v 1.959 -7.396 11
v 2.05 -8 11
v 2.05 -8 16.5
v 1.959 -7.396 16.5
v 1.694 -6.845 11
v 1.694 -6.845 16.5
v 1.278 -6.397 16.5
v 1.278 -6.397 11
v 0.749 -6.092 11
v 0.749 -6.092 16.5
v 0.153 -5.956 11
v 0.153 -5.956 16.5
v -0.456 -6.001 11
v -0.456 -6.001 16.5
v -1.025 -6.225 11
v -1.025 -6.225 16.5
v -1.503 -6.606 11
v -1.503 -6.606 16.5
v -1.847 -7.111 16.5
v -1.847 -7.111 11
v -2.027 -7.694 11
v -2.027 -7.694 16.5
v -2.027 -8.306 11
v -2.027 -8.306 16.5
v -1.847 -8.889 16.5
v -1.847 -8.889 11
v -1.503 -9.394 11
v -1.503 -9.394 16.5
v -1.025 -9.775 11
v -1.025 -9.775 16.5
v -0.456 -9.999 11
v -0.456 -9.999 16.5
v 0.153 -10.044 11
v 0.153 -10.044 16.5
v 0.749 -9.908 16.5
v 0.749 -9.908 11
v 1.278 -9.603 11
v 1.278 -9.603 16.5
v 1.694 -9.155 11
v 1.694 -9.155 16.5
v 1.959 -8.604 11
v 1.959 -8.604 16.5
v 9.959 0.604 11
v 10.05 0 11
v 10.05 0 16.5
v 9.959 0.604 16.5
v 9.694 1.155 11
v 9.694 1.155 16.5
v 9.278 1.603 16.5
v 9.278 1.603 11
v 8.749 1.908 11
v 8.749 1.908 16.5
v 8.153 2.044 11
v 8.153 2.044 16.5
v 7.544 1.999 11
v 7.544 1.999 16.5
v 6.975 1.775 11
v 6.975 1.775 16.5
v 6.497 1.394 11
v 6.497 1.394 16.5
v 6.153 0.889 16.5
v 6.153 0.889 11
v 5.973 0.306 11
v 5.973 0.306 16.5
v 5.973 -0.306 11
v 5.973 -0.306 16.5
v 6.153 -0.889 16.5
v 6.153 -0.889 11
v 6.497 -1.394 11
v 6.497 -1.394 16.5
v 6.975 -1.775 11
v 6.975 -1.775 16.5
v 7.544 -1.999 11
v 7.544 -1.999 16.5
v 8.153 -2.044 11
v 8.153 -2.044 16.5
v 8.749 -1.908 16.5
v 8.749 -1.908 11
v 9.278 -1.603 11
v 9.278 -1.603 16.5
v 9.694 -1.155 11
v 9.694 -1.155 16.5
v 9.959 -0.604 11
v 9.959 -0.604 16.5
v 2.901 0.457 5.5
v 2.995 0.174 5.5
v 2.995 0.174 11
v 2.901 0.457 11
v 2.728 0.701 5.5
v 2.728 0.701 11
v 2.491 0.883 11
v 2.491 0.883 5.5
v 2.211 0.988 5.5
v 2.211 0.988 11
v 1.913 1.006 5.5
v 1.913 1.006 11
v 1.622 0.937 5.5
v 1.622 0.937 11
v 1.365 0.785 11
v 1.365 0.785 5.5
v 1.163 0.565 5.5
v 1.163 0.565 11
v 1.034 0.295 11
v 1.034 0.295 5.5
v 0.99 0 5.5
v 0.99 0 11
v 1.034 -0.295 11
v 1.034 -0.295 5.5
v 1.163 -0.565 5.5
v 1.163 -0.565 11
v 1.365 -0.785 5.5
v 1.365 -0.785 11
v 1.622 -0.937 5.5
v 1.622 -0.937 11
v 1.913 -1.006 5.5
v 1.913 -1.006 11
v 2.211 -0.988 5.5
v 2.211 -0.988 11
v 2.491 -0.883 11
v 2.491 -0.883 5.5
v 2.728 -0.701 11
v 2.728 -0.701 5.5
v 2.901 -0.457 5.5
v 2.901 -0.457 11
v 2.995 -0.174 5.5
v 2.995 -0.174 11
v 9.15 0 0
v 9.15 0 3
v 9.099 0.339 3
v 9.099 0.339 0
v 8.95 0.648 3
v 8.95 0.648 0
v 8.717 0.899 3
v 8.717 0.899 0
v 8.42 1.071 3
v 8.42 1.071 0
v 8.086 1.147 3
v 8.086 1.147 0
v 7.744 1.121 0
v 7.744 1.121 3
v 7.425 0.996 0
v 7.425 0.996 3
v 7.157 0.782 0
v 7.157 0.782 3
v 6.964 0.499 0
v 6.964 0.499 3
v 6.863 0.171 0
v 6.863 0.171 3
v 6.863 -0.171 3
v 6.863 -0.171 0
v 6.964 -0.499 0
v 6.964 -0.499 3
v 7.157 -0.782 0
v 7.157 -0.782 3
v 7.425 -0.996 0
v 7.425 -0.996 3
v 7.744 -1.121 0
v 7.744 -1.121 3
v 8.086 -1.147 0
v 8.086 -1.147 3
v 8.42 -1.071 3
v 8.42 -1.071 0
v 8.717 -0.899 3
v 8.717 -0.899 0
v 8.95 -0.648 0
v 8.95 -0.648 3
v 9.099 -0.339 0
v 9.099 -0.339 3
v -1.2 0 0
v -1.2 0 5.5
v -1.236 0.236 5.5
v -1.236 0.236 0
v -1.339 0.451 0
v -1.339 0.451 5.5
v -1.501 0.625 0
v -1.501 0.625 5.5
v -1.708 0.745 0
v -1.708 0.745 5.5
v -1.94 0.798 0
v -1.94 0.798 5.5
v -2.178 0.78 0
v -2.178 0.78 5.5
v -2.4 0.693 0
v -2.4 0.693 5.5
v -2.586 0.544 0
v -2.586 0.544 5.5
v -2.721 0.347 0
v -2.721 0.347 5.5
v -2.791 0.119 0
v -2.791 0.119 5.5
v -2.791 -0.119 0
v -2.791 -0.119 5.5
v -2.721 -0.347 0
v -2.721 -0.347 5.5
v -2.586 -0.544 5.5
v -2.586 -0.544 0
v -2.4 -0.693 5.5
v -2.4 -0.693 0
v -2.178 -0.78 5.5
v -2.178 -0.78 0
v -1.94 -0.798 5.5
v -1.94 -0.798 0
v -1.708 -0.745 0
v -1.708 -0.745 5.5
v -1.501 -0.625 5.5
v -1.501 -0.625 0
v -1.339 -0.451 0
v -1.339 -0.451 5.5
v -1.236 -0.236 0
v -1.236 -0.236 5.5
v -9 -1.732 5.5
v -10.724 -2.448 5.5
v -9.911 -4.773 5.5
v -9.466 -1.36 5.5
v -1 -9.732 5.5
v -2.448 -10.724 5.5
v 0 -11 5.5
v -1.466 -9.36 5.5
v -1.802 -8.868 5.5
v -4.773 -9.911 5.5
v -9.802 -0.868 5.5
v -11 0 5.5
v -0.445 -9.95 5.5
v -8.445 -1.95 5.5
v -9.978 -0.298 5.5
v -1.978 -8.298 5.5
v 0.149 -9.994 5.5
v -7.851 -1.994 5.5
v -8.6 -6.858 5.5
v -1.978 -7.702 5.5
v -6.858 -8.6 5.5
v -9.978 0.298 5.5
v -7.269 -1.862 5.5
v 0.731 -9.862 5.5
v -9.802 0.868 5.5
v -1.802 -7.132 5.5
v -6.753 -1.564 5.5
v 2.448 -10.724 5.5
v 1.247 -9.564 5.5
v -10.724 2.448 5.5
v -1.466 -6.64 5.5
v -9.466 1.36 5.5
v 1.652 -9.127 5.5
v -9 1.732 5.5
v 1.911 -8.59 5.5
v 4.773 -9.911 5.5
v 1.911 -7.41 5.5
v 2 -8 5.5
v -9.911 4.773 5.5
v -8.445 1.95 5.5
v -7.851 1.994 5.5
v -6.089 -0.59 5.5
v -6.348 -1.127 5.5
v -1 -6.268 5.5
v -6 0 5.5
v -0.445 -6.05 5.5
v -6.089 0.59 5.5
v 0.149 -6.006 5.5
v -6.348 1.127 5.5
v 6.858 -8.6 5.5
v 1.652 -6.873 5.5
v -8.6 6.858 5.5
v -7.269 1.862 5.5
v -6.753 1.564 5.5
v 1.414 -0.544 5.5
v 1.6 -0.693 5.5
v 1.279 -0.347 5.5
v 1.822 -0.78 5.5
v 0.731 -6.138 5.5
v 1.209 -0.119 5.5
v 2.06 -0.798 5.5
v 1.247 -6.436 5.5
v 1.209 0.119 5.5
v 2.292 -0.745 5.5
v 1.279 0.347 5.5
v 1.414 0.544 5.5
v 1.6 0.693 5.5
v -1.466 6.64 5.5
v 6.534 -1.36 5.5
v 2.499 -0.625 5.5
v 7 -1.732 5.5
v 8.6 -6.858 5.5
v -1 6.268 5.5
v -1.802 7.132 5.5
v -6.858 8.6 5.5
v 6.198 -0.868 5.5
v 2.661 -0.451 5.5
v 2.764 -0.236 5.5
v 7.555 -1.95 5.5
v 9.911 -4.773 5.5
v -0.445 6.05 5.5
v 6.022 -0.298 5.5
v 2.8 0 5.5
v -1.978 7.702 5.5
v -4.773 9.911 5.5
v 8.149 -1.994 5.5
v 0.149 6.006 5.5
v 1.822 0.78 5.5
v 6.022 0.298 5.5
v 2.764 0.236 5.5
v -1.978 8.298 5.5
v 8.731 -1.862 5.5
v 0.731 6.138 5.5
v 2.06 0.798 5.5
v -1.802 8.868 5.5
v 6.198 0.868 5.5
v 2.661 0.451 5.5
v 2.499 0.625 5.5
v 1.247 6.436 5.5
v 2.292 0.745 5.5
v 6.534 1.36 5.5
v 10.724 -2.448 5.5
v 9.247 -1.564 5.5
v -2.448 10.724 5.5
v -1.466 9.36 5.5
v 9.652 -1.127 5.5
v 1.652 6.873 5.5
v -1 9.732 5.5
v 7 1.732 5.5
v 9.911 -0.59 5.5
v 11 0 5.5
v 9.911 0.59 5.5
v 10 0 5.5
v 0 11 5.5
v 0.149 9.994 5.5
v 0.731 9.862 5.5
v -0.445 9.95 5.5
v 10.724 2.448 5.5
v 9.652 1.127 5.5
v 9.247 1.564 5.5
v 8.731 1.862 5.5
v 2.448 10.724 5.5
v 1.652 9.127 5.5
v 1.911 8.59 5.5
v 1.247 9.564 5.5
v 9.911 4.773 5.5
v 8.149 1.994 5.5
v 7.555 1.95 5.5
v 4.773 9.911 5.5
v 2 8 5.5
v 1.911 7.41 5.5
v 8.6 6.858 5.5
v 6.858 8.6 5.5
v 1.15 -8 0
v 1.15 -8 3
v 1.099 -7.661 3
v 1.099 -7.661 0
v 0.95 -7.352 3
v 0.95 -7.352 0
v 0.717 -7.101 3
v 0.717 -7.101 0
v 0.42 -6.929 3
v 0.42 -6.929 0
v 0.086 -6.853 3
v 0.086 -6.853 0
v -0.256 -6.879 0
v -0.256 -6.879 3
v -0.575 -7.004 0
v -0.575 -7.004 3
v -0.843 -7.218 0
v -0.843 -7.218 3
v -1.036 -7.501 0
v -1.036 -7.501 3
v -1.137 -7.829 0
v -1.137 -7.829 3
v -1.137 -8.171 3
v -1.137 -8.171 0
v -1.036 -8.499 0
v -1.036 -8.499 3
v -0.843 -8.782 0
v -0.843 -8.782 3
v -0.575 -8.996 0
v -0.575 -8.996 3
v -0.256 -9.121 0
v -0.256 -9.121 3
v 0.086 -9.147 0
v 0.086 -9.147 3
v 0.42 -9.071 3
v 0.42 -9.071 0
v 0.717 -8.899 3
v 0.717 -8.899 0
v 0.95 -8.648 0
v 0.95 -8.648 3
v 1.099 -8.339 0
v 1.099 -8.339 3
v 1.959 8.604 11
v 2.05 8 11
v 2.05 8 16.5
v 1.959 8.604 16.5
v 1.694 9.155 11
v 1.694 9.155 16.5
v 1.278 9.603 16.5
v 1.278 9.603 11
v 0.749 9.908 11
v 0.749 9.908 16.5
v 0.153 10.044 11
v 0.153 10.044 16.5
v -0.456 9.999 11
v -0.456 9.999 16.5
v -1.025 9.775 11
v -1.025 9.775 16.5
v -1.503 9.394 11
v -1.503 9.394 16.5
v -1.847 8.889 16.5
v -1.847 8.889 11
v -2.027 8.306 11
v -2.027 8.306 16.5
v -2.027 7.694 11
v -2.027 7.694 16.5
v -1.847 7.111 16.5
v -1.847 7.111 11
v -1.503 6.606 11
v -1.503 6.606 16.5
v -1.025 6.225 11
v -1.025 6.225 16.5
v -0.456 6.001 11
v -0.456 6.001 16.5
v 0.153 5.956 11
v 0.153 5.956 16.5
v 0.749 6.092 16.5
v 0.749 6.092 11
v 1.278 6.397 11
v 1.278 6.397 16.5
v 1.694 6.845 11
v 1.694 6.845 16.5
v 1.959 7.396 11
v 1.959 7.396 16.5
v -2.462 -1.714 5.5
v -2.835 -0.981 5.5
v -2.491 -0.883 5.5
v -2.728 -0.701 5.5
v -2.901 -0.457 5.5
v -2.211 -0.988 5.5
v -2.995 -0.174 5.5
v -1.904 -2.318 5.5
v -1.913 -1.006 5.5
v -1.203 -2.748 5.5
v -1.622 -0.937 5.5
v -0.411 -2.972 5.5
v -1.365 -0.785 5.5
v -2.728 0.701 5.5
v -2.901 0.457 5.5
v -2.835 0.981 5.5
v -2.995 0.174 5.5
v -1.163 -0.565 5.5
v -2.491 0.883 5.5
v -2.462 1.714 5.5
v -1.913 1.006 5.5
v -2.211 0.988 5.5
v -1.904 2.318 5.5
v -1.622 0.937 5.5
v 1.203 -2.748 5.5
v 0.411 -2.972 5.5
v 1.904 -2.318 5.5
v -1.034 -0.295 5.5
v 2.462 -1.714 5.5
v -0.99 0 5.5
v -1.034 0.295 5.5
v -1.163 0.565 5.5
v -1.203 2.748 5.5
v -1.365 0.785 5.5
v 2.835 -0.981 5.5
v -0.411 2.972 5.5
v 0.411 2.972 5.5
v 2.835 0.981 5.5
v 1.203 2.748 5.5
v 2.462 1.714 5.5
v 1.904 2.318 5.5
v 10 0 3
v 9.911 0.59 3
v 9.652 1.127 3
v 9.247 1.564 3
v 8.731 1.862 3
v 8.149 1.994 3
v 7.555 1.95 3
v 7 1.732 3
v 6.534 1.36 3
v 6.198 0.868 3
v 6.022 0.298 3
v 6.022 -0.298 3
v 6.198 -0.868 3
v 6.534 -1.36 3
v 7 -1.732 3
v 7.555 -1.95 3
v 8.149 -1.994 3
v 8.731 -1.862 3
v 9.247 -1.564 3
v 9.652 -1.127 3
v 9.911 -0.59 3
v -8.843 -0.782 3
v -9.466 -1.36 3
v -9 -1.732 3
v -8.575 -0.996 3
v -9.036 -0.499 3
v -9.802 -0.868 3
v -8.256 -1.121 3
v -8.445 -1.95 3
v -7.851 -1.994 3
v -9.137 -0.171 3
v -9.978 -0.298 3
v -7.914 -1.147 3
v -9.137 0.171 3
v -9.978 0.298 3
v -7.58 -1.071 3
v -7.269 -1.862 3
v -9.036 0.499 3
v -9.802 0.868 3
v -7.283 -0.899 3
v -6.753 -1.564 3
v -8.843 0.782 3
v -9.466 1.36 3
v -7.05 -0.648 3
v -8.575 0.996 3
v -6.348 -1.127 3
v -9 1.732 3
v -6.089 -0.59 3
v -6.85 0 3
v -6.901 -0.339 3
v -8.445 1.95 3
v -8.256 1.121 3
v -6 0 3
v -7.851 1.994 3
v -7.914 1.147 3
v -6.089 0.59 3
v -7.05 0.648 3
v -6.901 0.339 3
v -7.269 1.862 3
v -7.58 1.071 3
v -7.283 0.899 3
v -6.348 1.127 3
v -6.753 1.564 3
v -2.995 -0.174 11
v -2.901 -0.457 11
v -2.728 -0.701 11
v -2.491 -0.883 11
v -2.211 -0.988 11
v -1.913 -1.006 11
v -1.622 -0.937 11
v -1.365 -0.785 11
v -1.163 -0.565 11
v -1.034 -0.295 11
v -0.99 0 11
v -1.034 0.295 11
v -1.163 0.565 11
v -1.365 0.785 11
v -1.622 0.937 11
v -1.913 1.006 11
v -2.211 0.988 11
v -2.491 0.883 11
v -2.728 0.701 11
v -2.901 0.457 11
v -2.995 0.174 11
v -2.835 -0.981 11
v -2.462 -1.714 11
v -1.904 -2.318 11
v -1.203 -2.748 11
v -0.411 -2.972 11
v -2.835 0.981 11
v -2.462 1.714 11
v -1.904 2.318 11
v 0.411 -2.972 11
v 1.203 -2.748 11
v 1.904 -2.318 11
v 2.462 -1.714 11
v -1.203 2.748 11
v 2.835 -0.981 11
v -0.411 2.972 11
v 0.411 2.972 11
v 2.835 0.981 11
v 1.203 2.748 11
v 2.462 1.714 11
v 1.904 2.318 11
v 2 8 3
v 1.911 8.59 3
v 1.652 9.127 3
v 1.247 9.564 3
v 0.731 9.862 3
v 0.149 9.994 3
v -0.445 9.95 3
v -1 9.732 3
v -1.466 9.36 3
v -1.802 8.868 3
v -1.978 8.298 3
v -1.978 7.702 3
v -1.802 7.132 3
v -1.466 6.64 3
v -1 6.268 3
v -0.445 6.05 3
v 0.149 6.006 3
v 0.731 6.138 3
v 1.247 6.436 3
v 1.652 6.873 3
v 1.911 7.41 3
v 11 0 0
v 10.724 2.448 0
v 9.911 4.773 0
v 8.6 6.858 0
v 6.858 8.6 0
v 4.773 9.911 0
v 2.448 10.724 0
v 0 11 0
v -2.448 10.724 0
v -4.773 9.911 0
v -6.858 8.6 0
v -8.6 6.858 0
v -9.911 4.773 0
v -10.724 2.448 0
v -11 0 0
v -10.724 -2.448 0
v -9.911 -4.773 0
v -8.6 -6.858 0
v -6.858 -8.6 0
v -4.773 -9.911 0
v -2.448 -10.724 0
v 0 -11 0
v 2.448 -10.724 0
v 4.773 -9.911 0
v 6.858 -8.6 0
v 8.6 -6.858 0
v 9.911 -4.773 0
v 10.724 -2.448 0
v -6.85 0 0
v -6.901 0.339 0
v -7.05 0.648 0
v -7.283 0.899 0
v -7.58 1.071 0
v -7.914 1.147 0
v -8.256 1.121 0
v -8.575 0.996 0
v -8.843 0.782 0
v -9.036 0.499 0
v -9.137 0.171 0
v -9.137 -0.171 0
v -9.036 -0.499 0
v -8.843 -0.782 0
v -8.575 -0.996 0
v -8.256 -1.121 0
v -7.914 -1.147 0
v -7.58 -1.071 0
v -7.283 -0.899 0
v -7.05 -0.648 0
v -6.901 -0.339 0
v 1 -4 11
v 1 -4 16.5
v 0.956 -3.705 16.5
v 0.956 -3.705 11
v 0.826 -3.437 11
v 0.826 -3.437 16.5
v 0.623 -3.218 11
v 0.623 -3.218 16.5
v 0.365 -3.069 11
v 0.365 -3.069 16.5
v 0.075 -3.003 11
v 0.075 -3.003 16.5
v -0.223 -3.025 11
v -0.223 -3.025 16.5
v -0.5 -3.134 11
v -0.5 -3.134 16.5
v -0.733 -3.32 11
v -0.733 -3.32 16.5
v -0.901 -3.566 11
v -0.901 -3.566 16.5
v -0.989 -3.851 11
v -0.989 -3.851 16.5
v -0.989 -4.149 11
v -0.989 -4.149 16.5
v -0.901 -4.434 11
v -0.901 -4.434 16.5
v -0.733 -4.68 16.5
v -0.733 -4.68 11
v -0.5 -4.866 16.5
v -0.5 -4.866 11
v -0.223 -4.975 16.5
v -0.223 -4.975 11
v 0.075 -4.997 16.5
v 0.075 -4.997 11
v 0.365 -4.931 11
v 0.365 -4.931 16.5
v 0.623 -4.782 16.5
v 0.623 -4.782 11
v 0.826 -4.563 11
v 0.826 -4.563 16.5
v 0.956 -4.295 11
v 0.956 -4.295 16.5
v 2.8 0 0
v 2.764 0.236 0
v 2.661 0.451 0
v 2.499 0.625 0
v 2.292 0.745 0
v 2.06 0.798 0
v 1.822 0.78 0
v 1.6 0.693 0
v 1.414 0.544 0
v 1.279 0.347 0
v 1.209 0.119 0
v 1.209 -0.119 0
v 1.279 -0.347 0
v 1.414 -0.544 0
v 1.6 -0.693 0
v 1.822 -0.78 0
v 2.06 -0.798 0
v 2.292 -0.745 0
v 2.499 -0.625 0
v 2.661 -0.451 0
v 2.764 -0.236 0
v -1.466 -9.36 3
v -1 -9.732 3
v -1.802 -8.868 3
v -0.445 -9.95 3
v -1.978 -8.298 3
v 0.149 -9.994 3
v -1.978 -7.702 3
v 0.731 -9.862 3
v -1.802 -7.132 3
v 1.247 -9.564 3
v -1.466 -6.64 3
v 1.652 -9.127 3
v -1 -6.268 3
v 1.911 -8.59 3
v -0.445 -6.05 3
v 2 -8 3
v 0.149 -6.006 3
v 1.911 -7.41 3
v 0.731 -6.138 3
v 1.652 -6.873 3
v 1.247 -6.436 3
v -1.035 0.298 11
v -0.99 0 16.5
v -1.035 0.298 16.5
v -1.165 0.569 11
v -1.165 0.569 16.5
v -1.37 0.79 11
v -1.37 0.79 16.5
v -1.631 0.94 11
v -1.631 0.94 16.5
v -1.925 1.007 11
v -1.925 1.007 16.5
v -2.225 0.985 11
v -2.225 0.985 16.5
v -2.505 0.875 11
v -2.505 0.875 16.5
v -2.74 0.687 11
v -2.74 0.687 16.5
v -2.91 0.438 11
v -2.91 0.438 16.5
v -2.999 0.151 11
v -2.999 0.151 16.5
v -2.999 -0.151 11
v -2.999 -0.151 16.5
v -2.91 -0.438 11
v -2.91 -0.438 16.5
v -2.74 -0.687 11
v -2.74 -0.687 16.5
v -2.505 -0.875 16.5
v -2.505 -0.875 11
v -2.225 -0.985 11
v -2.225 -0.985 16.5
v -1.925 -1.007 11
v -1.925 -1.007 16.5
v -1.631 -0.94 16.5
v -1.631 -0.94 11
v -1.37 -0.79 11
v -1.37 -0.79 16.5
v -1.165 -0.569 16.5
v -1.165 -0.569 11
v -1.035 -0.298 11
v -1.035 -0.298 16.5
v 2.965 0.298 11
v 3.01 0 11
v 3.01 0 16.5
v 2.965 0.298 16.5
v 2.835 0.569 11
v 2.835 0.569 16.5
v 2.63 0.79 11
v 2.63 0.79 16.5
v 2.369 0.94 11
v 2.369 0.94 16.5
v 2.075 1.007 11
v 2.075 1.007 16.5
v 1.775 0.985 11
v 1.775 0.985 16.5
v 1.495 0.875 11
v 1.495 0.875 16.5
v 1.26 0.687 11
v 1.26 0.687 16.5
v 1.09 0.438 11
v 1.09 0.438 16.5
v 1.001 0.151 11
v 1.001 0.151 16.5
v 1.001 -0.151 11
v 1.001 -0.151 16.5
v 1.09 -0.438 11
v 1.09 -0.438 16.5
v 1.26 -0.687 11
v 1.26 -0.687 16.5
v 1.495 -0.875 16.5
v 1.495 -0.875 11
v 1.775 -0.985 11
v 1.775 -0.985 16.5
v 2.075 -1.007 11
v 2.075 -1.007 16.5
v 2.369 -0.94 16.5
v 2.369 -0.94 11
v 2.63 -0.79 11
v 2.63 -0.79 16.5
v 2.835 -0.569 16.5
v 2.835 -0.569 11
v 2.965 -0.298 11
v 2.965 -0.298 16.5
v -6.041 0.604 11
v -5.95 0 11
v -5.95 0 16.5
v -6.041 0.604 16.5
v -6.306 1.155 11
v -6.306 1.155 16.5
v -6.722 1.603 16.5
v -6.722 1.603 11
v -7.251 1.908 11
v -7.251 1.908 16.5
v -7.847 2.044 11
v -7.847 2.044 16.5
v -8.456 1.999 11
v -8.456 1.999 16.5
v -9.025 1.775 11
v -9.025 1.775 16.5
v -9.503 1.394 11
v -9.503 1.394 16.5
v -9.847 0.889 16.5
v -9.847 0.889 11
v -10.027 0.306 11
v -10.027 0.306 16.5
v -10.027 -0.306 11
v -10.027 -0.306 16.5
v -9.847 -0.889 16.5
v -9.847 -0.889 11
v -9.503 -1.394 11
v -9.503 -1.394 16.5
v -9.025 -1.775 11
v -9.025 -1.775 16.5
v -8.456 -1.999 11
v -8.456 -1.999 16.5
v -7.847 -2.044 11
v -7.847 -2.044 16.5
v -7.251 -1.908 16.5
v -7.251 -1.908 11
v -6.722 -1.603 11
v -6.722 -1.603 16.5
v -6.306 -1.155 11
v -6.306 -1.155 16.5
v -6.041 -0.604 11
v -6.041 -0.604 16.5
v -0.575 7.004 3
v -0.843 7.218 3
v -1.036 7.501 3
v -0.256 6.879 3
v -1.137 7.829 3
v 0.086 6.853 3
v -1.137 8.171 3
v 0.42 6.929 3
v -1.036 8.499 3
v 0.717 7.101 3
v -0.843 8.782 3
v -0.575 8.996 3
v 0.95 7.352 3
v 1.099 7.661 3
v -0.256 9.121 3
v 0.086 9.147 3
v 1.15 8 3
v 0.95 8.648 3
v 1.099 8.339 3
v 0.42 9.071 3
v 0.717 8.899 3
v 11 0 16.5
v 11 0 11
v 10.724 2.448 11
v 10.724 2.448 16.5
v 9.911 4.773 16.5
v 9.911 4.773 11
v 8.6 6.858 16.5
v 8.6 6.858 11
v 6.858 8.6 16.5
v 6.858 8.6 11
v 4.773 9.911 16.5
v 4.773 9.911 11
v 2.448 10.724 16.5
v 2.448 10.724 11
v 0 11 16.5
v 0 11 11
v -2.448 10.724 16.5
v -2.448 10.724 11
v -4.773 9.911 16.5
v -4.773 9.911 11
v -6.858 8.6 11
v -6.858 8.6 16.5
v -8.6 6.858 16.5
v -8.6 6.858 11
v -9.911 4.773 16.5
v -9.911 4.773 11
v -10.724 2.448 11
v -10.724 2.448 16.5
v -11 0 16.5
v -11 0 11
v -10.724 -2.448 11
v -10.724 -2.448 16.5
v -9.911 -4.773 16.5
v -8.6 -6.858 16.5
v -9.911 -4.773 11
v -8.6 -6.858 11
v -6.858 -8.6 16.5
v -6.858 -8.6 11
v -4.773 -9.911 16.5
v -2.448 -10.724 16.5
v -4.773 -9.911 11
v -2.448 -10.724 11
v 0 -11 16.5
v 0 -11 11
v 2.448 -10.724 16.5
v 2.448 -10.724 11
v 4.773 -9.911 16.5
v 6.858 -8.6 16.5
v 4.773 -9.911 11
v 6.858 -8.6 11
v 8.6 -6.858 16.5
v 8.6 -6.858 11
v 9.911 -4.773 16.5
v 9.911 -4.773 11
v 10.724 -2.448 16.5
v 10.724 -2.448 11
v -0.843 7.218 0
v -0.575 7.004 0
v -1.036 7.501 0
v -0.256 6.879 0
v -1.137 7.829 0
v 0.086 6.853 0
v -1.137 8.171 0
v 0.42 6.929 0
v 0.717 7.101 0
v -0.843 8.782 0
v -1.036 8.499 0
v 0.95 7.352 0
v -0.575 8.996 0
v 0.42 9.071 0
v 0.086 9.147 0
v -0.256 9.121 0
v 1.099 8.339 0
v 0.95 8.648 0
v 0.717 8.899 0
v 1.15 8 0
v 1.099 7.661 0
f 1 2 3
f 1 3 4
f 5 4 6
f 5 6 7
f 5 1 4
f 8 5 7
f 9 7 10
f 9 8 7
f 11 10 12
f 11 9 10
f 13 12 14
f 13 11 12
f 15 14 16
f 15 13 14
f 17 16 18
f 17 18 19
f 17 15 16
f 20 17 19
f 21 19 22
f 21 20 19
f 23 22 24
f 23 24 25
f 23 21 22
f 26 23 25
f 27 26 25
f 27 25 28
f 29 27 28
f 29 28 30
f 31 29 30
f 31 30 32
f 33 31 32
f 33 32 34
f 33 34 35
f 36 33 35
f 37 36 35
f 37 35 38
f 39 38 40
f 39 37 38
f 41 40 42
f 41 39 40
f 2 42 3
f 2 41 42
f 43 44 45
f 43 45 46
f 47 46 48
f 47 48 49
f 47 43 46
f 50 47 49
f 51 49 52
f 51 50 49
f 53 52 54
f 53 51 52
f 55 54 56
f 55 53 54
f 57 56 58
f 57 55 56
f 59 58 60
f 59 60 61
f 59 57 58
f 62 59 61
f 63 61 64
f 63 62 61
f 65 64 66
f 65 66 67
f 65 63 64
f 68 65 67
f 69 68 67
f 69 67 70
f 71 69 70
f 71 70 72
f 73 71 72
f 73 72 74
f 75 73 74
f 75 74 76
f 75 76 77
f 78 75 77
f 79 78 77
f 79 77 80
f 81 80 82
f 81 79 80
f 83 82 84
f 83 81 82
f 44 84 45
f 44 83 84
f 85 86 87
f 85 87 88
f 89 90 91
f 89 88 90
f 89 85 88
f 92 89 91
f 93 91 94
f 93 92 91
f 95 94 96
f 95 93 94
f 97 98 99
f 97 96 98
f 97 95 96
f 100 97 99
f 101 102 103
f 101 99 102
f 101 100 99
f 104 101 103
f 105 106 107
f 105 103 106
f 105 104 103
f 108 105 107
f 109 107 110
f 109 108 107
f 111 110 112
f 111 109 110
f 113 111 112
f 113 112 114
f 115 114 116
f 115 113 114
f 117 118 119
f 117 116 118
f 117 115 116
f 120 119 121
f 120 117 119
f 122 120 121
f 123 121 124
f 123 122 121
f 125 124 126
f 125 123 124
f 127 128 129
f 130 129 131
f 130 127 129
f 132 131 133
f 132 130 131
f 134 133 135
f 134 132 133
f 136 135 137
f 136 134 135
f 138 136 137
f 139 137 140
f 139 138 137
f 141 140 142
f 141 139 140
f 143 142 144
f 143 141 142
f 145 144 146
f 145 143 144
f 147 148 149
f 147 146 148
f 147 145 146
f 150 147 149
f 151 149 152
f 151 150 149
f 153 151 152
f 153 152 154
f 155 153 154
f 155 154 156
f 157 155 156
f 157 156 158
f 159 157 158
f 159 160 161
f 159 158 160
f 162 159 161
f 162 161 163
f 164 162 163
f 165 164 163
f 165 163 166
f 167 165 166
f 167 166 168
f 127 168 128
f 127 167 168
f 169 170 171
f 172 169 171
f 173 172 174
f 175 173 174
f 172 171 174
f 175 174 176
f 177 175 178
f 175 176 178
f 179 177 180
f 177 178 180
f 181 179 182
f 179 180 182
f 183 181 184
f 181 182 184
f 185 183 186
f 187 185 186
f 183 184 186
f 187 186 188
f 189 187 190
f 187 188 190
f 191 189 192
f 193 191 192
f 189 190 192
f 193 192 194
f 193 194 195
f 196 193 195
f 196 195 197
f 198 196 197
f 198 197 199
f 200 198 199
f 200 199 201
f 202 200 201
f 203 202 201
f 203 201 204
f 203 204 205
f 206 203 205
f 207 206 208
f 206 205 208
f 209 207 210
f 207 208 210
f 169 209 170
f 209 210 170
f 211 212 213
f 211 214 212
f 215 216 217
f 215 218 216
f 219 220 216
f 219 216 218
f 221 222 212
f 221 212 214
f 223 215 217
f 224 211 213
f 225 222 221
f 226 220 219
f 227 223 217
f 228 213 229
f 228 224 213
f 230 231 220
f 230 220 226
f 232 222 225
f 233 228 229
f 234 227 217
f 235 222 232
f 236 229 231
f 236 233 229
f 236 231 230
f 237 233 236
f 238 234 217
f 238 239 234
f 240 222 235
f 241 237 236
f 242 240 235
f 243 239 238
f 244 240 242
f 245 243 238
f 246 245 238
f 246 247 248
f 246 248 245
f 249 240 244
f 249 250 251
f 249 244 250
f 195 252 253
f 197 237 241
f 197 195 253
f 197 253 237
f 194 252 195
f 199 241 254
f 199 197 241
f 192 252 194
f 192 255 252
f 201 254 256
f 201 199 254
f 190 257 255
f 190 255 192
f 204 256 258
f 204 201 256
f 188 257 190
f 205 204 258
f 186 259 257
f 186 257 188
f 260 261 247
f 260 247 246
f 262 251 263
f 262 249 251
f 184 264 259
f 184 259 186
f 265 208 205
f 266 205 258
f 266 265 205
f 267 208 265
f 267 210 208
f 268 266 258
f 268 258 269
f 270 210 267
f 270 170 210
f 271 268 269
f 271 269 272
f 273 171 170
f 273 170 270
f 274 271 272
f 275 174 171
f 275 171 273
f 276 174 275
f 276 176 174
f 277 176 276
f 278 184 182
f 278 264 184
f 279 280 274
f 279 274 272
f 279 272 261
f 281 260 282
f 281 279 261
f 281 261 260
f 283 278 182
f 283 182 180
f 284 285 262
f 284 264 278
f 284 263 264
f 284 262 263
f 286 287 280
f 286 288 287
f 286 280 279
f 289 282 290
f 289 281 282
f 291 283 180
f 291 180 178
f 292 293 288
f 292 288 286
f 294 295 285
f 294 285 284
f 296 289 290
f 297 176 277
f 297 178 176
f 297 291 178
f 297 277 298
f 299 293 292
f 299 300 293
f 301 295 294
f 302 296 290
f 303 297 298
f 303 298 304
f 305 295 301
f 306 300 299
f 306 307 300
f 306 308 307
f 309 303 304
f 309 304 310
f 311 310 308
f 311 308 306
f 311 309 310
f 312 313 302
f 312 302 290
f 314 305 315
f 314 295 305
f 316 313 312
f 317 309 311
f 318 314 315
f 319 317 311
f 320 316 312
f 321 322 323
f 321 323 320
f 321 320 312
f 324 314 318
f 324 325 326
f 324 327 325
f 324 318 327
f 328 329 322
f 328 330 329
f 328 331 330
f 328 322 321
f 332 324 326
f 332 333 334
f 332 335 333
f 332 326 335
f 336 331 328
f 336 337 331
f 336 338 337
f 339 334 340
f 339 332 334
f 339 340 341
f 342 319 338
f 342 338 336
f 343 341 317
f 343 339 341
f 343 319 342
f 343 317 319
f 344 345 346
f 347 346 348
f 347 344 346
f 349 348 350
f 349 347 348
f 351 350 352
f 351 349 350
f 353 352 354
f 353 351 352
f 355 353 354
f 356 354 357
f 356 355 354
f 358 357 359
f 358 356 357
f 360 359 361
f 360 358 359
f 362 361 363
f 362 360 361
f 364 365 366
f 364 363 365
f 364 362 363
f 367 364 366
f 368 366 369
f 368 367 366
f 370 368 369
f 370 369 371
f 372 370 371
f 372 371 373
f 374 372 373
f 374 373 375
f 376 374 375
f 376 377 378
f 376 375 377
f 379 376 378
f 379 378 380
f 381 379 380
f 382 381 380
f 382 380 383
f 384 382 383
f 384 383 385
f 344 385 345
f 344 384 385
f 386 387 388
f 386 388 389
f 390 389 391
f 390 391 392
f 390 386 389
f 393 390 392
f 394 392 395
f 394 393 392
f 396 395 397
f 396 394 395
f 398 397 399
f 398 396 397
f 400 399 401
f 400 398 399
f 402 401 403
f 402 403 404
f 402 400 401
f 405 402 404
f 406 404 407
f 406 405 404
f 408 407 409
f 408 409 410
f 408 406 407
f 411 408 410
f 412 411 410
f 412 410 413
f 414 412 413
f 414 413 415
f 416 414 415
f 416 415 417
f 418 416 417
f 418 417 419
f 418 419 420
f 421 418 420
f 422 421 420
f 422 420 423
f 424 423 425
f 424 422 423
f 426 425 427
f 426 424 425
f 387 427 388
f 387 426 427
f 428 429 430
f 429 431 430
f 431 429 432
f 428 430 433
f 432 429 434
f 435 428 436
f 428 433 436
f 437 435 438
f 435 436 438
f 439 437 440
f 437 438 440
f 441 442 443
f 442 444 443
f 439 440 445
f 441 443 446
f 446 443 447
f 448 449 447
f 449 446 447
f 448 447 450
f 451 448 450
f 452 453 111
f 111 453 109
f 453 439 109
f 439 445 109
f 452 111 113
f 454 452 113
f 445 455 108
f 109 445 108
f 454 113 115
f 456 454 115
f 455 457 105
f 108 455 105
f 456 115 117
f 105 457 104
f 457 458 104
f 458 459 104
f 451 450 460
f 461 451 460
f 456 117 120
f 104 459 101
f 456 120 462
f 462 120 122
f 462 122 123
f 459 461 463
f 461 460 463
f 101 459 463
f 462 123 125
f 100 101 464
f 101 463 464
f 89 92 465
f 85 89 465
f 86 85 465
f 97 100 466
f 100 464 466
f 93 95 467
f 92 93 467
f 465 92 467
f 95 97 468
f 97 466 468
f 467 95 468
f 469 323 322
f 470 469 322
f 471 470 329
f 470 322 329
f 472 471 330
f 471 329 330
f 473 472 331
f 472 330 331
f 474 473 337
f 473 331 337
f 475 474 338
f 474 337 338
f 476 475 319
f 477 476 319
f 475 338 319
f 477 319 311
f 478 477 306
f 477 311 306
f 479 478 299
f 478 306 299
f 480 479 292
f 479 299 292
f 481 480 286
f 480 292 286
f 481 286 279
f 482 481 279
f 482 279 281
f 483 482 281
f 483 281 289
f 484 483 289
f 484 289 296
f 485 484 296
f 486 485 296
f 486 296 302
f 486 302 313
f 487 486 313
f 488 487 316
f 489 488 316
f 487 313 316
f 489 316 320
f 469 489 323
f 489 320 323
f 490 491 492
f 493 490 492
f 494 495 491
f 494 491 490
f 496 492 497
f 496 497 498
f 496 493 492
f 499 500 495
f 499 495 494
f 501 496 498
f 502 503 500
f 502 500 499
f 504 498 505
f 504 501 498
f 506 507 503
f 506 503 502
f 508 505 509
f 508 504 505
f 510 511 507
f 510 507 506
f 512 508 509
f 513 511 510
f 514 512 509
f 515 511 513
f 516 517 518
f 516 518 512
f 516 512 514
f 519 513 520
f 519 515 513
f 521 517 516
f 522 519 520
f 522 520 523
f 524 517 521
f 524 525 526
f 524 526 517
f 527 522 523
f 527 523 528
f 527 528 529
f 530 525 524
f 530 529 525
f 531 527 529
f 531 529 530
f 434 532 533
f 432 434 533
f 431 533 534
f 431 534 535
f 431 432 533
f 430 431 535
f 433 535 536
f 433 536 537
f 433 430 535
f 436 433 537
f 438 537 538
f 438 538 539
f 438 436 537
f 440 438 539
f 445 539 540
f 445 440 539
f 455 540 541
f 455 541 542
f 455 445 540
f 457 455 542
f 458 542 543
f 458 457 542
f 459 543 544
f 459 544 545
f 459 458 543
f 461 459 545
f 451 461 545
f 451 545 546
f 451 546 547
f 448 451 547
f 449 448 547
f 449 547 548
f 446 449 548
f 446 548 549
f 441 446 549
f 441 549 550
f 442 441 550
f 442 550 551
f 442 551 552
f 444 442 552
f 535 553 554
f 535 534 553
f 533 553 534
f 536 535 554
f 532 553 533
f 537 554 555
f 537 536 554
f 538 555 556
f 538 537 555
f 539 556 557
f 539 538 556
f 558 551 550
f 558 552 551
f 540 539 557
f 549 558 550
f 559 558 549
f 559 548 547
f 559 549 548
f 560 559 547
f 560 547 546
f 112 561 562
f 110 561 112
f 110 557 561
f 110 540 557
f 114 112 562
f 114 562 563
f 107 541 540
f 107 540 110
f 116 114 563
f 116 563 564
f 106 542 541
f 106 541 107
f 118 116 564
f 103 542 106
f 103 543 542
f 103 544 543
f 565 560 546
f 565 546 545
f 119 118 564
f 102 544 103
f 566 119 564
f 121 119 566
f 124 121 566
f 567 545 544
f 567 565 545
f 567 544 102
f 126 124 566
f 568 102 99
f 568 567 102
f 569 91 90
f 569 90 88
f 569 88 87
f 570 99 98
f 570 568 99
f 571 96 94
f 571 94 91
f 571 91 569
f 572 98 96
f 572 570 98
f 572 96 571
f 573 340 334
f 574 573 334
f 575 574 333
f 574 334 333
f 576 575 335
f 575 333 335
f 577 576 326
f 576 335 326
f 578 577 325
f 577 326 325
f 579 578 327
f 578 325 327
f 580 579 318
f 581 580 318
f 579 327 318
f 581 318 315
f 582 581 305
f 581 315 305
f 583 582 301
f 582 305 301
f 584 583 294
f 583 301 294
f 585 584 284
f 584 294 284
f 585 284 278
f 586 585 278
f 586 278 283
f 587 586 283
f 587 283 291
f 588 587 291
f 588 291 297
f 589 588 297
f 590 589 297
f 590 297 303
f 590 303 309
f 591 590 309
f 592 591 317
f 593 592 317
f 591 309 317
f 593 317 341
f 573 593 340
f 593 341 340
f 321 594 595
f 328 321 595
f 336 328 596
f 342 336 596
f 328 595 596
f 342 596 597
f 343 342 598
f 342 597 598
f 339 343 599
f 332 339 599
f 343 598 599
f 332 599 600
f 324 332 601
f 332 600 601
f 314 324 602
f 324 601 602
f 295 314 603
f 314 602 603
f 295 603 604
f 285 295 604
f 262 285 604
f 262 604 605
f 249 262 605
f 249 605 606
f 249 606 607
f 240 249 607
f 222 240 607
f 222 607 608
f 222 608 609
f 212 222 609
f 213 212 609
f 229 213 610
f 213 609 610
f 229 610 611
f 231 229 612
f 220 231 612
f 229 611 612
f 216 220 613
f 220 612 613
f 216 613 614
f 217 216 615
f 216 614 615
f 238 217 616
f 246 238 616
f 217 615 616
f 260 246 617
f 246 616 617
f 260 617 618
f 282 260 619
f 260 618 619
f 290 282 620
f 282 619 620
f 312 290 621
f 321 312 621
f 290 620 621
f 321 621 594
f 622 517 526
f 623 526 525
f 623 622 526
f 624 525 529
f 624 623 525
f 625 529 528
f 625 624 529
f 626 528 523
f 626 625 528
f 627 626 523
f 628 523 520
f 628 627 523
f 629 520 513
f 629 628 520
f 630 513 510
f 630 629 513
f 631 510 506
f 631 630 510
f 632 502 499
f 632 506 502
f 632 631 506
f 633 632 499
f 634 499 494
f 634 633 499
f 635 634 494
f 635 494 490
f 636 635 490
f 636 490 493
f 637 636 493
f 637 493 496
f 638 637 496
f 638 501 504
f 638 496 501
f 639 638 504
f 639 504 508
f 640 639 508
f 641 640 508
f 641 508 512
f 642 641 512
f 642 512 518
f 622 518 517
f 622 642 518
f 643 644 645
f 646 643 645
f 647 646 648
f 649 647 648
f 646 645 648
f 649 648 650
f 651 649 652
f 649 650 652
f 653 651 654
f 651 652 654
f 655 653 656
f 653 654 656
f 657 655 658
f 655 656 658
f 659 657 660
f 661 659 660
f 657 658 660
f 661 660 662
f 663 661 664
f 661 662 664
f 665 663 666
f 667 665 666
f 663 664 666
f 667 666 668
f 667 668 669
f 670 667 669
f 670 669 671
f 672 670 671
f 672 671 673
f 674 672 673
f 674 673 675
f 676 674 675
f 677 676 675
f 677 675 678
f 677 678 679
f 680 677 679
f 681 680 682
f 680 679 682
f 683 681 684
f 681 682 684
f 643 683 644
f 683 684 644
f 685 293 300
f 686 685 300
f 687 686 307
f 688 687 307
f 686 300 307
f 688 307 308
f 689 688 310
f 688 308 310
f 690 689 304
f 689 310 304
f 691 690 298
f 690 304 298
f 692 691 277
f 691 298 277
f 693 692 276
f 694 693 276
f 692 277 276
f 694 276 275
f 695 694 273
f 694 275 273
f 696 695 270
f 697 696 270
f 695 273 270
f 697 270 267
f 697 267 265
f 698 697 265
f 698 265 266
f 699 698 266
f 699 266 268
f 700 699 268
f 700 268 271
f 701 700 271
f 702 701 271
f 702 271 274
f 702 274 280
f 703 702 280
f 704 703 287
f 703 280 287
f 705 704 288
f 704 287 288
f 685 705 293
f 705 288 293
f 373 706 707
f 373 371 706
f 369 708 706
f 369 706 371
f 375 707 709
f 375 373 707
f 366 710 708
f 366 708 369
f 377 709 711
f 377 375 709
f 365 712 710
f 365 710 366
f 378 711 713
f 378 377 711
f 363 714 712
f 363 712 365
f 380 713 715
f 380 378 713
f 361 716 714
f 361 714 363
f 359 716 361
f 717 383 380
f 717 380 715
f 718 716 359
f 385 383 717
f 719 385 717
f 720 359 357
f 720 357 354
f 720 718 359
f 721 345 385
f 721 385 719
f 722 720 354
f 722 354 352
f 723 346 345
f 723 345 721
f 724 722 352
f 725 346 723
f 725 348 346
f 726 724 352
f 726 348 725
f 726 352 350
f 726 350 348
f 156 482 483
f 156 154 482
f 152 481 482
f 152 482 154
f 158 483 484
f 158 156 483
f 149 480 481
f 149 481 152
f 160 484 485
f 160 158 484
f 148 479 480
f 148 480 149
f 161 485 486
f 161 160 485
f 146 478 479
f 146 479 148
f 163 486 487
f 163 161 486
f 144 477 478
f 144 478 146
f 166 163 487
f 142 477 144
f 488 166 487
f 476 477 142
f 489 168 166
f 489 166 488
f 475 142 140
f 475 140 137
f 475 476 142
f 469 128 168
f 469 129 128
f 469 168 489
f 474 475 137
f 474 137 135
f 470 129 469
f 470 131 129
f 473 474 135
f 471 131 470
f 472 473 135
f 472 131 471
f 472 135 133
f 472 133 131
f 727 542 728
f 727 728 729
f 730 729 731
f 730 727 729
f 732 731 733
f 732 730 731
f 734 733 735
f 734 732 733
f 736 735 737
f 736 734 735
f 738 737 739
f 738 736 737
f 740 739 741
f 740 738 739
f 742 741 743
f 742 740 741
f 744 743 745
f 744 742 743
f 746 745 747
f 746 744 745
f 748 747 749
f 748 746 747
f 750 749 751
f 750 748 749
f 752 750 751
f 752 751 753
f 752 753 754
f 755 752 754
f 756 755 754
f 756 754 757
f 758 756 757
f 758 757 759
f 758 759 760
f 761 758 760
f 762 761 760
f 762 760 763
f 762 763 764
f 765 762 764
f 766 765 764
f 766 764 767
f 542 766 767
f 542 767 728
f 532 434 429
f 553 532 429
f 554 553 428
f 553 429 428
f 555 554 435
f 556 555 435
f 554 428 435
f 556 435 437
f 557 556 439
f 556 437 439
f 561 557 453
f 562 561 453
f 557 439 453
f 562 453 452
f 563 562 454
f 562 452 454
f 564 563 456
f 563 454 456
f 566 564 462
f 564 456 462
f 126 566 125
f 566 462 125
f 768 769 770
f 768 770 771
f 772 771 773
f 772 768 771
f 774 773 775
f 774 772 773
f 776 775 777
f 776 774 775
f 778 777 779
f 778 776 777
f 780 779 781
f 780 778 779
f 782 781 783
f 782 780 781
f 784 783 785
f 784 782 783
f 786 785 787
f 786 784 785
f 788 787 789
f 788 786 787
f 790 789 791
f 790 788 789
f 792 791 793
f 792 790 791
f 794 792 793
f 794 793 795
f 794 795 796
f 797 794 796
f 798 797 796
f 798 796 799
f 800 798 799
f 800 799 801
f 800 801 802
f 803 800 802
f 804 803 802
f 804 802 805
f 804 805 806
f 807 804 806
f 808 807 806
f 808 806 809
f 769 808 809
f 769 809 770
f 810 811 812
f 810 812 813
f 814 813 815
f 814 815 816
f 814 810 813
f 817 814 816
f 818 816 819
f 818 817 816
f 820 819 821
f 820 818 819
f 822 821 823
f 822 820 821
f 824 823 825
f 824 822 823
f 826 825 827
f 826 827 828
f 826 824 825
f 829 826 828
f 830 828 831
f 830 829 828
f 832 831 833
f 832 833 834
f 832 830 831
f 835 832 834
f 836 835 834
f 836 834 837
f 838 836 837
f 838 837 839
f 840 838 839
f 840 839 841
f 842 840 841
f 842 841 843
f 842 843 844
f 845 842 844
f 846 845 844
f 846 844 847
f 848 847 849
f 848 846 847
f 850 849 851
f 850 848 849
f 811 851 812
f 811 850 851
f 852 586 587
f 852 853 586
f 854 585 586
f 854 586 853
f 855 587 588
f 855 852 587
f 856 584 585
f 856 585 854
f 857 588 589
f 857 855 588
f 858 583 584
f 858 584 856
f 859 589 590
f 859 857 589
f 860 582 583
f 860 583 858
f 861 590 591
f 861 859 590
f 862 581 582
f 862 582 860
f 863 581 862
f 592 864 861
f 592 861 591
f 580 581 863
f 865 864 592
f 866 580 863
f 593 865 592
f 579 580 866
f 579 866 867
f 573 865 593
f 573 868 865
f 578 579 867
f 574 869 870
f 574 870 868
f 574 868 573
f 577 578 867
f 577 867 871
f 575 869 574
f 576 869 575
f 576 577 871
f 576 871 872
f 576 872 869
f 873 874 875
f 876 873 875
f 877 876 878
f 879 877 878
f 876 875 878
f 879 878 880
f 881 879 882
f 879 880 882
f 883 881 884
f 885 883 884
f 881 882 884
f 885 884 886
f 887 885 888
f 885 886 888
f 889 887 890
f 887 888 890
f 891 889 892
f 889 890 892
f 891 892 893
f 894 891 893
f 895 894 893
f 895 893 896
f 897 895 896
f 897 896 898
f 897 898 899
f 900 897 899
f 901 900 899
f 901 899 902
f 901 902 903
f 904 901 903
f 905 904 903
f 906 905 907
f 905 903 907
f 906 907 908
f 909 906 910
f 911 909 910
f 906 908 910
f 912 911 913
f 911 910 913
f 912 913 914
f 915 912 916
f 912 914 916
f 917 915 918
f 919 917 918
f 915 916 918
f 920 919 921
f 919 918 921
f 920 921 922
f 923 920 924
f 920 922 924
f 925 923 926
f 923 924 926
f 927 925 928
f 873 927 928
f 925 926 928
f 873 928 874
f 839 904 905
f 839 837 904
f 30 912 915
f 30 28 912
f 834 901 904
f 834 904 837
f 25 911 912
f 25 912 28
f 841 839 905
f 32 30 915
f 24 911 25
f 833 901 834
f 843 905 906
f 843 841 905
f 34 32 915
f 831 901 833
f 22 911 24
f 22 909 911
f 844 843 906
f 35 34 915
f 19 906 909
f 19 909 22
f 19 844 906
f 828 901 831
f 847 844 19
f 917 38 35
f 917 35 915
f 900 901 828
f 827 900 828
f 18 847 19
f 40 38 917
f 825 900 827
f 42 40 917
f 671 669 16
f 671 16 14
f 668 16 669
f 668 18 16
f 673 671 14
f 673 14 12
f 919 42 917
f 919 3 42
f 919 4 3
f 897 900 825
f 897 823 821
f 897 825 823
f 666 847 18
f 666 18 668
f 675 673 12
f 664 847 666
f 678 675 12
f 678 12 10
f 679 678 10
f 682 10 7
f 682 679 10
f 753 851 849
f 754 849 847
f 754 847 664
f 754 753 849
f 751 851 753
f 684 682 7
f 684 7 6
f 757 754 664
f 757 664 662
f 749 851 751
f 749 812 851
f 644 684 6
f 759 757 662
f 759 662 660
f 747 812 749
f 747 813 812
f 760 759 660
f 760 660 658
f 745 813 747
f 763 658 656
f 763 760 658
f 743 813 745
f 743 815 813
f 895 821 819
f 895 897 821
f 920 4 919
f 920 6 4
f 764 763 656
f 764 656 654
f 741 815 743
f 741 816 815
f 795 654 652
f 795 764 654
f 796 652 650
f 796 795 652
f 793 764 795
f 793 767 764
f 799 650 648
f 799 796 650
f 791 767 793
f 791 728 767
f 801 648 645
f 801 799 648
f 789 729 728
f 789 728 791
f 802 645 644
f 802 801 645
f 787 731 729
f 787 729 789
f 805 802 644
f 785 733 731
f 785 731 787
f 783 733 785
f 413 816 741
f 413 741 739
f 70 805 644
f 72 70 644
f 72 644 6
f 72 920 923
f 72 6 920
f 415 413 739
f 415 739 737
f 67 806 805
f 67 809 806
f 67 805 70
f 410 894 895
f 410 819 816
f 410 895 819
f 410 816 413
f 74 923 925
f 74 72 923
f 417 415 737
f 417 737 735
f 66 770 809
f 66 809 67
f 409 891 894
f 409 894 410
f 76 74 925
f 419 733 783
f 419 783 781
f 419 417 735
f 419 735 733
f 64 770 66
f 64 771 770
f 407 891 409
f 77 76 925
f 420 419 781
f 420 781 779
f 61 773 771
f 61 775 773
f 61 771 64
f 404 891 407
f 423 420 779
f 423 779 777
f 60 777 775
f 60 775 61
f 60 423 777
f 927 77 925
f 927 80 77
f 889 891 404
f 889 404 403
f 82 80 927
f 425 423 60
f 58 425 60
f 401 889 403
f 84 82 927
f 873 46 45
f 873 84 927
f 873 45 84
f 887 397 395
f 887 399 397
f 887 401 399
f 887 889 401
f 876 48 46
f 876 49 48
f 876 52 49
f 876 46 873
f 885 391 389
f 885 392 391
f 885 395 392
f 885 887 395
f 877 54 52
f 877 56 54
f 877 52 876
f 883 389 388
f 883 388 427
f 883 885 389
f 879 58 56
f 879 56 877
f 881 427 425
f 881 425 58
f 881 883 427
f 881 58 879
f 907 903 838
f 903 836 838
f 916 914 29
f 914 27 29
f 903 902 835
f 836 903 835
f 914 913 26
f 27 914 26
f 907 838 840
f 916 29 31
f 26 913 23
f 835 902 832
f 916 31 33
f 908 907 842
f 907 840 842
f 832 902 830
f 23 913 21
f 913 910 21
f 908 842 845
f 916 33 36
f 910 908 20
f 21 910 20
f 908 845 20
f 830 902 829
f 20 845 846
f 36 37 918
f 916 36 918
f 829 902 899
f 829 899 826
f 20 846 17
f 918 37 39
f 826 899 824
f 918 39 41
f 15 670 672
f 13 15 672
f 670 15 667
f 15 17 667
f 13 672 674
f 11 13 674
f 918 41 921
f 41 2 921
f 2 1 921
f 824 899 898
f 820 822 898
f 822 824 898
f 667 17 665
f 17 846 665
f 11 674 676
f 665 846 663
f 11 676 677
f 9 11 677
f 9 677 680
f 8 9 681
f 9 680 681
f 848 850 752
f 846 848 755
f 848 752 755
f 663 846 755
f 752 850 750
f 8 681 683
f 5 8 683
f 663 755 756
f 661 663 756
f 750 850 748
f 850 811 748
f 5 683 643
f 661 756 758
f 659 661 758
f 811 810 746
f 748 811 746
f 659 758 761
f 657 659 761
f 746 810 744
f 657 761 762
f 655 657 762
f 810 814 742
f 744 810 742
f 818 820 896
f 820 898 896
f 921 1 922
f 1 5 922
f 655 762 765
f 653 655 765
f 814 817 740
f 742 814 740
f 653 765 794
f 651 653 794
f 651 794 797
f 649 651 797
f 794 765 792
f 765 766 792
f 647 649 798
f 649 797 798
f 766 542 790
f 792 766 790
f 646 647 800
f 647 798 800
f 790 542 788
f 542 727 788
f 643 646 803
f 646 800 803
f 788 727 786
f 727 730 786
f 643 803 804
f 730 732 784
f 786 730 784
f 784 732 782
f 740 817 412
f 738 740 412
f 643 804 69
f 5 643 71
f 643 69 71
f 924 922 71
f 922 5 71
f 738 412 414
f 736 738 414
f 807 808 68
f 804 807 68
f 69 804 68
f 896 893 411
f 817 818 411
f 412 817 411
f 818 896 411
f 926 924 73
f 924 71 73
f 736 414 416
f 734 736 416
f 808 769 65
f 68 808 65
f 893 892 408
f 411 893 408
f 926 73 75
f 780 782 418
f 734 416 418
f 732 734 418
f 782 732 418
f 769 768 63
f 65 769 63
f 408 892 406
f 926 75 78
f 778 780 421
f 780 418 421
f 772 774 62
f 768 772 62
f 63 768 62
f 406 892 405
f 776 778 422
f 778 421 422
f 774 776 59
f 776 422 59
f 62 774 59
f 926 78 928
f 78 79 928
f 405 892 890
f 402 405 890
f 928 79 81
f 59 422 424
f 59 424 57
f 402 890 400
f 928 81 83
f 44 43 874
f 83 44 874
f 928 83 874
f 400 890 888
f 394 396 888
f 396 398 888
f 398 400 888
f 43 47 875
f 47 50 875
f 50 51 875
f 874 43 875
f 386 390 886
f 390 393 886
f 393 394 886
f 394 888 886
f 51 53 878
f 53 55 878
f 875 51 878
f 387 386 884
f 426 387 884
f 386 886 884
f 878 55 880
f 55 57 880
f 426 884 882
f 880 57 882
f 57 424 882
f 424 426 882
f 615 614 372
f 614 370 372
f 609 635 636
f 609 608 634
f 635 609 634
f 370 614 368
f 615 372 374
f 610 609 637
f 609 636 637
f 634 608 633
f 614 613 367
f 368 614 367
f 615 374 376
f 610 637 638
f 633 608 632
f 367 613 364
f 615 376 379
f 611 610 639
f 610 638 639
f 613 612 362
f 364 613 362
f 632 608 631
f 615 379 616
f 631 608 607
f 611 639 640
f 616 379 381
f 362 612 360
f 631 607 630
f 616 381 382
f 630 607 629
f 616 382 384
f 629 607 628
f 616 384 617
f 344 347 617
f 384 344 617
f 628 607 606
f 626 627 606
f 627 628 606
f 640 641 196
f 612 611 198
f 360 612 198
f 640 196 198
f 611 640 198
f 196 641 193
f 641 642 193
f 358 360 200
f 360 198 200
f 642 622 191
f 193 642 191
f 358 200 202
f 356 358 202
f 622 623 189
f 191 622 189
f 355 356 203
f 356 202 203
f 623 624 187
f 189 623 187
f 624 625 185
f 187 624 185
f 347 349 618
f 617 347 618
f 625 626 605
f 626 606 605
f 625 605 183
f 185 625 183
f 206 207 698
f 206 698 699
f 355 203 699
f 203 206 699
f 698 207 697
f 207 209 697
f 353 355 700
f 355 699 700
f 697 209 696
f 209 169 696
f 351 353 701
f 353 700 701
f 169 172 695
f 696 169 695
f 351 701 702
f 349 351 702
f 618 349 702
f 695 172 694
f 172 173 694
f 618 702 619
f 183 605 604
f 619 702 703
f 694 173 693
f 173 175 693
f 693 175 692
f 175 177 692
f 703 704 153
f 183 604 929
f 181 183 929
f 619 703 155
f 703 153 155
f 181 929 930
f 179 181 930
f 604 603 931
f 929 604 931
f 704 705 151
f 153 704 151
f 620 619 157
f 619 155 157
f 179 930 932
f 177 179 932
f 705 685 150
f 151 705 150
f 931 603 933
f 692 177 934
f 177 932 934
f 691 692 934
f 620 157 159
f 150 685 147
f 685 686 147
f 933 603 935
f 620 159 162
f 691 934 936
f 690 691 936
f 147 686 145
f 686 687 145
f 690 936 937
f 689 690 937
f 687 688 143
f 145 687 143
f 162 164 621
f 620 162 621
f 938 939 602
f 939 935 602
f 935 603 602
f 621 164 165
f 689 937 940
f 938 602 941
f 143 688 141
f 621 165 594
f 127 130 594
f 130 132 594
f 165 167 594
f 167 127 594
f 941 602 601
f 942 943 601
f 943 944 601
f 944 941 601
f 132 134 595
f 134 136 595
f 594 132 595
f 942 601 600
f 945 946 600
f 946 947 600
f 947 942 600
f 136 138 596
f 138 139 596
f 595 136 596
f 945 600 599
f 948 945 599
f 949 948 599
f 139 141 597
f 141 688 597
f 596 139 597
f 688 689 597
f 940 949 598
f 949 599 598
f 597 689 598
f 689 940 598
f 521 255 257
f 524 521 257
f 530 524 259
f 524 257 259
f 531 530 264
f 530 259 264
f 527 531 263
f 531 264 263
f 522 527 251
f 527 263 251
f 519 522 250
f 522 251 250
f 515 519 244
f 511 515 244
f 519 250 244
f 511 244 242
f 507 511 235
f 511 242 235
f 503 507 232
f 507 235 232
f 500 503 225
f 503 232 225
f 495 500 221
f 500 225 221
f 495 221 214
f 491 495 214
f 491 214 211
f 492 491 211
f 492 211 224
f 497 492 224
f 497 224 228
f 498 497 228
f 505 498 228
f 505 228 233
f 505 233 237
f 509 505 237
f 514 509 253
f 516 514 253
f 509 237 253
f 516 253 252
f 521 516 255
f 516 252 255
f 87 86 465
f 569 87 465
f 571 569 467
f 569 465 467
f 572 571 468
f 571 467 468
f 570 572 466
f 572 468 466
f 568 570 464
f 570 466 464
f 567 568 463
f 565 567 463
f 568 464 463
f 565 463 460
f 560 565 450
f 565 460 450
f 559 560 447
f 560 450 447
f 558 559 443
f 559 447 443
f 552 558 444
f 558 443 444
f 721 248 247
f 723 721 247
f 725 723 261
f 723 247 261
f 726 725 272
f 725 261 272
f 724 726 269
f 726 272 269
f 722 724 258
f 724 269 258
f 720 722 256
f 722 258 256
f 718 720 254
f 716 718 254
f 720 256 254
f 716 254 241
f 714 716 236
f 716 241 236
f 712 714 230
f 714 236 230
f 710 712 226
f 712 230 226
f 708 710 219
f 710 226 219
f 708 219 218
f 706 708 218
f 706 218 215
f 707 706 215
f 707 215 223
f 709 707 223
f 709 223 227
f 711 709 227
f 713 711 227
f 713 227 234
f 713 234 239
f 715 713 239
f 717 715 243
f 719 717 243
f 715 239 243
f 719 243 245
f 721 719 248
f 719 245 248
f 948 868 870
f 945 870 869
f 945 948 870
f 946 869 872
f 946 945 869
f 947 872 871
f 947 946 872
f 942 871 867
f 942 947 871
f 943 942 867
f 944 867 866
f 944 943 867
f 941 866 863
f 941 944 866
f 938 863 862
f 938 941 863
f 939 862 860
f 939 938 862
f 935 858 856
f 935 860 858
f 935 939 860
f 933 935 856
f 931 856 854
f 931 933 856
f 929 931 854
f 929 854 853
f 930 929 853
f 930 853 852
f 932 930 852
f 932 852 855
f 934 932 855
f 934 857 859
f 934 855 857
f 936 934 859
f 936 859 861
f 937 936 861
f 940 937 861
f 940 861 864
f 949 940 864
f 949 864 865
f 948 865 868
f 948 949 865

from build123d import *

# Parameters (mm, degrees)
SKETCH_1_R          = 11
SKETCH_1_R_2        = 1.15
EXTRUDE_1_DEPTH     = 5.5
SKETCH_2_R          = 3
EXTRUDE_2_DEPTH     = 5.5
SKETCH_3_R          = 11
SKETCH_3_R_2        = 2.05
EXTRUDE_3_DEPTH     = 5.5
CUT_EXTRUDE_START   = -16.5
SKETCH_8_R          = 1.01
CUT_EXTRUDE_4_DEPTH = 16.5
SKETCH_9_R          = 0.8
CUT_EXTRUDE_5_DEPTH = 5.5
SKETCH_12_R         = 2
CUT_EXTRUDE_7_DEPTH = 2.5
SKETCH_13_R         = 1
CUT_EXTRUDE_8_DEPTH = 5.5


with BuildPart() as part:
    # ｽｹｯﾁ1 → ﾎﾞｽ - 押し出し1 (new body)
    with BuildSketch(Plane.XY):
        Circle(SKETCH_1_R)
        with Locations((-8, 0)):
            Circle(SKETCH_1_R_2, mode=Mode.SUBTRACT)
        with Locations((0, 8)):
            Circle(SKETCH_1_R_2, mode=Mode.SUBTRACT)
        with Locations((8, 0)):
            Circle(SKETCH_1_R_2, mode=Mode.SUBTRACT)
        with Locations((0, -8)):
            Circle(SKETCH_1_R_2, mode=Mode.SUBTRACT)
    extrude(amount=EXTRUDE_1_DEPTH)

    # ｽｹｯﾁ9 → ｶｯﾄ - 押し出し5 (cut)
    with BuildSketch(Plane.XY.offset(5.5)):
        with Locations((-2, 0)):
            Circle(SKETCH_9_R)
        with Locations((2, 0)):
            Circle(SKETCH_9_R)
    extrude(amount=-CUT_EXTRUDE_5_DEPTH, mode=Mode.SUBTRACT)

    # ｽｹｯﾁ12 → ｶｯﾄ - 押し出し7 (cut)
    with BuildSketch(Plane.XY.offset(5.5)):
        with Locations((-8, 0)):
            Circle(SKETCH_12_R)
        with Locations((0, 8)):
            Circle(SKETCH_12_R)
        with Locations((8, 0)):
            Circle(SKETCH_12_R)
        with Locations((0, -8)):
            Circle(SKETCH_12_R)
    extrude(amount=-CUT_EXTRUDE_7_DEPTH, mode=Mode.SUBTRACT)


with BuildPart() as body_2:
    # ｽｹｯﾁ2 → ﾎﾞｽ - 押し出し2 (new body)
    with BuildSketch(Plane.XY.offset(5.5)):
        Circle(SKETCH_2_R)
    extrude(amount=EXTRUDE_2_DEPTH)


with BuildPart() as body_3:
    # ｽｹｯﾁ3 → ﾎﾞｽ - 押し出し3 (new body)
    with BuildSketch(Plane.XY.offset(11)):
        Circle(SKETCH_3_R)
        with Locations((-8, 0)):
            Circle(SKETCH_3_R_2, mode=Mode.SUBTRACT)
        with Locations((0, 8)):
            Circle(SKETCH_3_R_2, mode=Mode.SUBTRACT)
        with Locations((8, 0)):
            Circle(SKETCH_3_R_2, mode=Mode.SUBTRACT)
        with Locations((0, -8)):
            Circle(SKETCH_3_R_2, mode=Mode.SUBTRACT)
    extrude(amount=EXTRUDE_3_DEPTH)


with BuildPart() as cut_extrude_4_tool:
    # ｽｹｯﾁ8 → ｶｯﾄ - 押し出し4 (new body)
    with BuildSketch(Plane.XY.offset(16.5).offset(CUT_EXTRUDE_START)):
        with Locations((-2, 0)):
            Circle(SKETCH_8_R)
        with Locations((2, 0)):
            Circle(SKETCH_8_R)
    extrude(amount=CUT_EXTRUDE_4_DEPTH)


with BuildPart() as body_2_1:
    add(body_2.part)

    # ｶｯﾄ - 押し出し4: cut by cut_extrude_4_tool
    add(cut_extrude_4_tool.part, mode=Mode.SUBTRACT)


with BuildPart() as body_3_1:
    add(body_3.part)

    # ｶｯﾄ - 押し出し4: cut by cut_extrude_4_tool
    add(cut_extrude_4_tool.part, mode=Mode.SUBTRACT)

    # ｽｹｯﾁ13 → ｶｯﾄ - 押し出し8 (cut)
    with BuildSketch(Plane.XY.offset(16.5)):
        with Locations((0, -4)):
            Circle(SKETCH_13_R)
    extrude(amount=-CUT_EXTRUDE_8_DEPTH, mode=Mode.SUBTRACT)


solid = Compound([part.part, body_2_1.part, body_3_1.part])
